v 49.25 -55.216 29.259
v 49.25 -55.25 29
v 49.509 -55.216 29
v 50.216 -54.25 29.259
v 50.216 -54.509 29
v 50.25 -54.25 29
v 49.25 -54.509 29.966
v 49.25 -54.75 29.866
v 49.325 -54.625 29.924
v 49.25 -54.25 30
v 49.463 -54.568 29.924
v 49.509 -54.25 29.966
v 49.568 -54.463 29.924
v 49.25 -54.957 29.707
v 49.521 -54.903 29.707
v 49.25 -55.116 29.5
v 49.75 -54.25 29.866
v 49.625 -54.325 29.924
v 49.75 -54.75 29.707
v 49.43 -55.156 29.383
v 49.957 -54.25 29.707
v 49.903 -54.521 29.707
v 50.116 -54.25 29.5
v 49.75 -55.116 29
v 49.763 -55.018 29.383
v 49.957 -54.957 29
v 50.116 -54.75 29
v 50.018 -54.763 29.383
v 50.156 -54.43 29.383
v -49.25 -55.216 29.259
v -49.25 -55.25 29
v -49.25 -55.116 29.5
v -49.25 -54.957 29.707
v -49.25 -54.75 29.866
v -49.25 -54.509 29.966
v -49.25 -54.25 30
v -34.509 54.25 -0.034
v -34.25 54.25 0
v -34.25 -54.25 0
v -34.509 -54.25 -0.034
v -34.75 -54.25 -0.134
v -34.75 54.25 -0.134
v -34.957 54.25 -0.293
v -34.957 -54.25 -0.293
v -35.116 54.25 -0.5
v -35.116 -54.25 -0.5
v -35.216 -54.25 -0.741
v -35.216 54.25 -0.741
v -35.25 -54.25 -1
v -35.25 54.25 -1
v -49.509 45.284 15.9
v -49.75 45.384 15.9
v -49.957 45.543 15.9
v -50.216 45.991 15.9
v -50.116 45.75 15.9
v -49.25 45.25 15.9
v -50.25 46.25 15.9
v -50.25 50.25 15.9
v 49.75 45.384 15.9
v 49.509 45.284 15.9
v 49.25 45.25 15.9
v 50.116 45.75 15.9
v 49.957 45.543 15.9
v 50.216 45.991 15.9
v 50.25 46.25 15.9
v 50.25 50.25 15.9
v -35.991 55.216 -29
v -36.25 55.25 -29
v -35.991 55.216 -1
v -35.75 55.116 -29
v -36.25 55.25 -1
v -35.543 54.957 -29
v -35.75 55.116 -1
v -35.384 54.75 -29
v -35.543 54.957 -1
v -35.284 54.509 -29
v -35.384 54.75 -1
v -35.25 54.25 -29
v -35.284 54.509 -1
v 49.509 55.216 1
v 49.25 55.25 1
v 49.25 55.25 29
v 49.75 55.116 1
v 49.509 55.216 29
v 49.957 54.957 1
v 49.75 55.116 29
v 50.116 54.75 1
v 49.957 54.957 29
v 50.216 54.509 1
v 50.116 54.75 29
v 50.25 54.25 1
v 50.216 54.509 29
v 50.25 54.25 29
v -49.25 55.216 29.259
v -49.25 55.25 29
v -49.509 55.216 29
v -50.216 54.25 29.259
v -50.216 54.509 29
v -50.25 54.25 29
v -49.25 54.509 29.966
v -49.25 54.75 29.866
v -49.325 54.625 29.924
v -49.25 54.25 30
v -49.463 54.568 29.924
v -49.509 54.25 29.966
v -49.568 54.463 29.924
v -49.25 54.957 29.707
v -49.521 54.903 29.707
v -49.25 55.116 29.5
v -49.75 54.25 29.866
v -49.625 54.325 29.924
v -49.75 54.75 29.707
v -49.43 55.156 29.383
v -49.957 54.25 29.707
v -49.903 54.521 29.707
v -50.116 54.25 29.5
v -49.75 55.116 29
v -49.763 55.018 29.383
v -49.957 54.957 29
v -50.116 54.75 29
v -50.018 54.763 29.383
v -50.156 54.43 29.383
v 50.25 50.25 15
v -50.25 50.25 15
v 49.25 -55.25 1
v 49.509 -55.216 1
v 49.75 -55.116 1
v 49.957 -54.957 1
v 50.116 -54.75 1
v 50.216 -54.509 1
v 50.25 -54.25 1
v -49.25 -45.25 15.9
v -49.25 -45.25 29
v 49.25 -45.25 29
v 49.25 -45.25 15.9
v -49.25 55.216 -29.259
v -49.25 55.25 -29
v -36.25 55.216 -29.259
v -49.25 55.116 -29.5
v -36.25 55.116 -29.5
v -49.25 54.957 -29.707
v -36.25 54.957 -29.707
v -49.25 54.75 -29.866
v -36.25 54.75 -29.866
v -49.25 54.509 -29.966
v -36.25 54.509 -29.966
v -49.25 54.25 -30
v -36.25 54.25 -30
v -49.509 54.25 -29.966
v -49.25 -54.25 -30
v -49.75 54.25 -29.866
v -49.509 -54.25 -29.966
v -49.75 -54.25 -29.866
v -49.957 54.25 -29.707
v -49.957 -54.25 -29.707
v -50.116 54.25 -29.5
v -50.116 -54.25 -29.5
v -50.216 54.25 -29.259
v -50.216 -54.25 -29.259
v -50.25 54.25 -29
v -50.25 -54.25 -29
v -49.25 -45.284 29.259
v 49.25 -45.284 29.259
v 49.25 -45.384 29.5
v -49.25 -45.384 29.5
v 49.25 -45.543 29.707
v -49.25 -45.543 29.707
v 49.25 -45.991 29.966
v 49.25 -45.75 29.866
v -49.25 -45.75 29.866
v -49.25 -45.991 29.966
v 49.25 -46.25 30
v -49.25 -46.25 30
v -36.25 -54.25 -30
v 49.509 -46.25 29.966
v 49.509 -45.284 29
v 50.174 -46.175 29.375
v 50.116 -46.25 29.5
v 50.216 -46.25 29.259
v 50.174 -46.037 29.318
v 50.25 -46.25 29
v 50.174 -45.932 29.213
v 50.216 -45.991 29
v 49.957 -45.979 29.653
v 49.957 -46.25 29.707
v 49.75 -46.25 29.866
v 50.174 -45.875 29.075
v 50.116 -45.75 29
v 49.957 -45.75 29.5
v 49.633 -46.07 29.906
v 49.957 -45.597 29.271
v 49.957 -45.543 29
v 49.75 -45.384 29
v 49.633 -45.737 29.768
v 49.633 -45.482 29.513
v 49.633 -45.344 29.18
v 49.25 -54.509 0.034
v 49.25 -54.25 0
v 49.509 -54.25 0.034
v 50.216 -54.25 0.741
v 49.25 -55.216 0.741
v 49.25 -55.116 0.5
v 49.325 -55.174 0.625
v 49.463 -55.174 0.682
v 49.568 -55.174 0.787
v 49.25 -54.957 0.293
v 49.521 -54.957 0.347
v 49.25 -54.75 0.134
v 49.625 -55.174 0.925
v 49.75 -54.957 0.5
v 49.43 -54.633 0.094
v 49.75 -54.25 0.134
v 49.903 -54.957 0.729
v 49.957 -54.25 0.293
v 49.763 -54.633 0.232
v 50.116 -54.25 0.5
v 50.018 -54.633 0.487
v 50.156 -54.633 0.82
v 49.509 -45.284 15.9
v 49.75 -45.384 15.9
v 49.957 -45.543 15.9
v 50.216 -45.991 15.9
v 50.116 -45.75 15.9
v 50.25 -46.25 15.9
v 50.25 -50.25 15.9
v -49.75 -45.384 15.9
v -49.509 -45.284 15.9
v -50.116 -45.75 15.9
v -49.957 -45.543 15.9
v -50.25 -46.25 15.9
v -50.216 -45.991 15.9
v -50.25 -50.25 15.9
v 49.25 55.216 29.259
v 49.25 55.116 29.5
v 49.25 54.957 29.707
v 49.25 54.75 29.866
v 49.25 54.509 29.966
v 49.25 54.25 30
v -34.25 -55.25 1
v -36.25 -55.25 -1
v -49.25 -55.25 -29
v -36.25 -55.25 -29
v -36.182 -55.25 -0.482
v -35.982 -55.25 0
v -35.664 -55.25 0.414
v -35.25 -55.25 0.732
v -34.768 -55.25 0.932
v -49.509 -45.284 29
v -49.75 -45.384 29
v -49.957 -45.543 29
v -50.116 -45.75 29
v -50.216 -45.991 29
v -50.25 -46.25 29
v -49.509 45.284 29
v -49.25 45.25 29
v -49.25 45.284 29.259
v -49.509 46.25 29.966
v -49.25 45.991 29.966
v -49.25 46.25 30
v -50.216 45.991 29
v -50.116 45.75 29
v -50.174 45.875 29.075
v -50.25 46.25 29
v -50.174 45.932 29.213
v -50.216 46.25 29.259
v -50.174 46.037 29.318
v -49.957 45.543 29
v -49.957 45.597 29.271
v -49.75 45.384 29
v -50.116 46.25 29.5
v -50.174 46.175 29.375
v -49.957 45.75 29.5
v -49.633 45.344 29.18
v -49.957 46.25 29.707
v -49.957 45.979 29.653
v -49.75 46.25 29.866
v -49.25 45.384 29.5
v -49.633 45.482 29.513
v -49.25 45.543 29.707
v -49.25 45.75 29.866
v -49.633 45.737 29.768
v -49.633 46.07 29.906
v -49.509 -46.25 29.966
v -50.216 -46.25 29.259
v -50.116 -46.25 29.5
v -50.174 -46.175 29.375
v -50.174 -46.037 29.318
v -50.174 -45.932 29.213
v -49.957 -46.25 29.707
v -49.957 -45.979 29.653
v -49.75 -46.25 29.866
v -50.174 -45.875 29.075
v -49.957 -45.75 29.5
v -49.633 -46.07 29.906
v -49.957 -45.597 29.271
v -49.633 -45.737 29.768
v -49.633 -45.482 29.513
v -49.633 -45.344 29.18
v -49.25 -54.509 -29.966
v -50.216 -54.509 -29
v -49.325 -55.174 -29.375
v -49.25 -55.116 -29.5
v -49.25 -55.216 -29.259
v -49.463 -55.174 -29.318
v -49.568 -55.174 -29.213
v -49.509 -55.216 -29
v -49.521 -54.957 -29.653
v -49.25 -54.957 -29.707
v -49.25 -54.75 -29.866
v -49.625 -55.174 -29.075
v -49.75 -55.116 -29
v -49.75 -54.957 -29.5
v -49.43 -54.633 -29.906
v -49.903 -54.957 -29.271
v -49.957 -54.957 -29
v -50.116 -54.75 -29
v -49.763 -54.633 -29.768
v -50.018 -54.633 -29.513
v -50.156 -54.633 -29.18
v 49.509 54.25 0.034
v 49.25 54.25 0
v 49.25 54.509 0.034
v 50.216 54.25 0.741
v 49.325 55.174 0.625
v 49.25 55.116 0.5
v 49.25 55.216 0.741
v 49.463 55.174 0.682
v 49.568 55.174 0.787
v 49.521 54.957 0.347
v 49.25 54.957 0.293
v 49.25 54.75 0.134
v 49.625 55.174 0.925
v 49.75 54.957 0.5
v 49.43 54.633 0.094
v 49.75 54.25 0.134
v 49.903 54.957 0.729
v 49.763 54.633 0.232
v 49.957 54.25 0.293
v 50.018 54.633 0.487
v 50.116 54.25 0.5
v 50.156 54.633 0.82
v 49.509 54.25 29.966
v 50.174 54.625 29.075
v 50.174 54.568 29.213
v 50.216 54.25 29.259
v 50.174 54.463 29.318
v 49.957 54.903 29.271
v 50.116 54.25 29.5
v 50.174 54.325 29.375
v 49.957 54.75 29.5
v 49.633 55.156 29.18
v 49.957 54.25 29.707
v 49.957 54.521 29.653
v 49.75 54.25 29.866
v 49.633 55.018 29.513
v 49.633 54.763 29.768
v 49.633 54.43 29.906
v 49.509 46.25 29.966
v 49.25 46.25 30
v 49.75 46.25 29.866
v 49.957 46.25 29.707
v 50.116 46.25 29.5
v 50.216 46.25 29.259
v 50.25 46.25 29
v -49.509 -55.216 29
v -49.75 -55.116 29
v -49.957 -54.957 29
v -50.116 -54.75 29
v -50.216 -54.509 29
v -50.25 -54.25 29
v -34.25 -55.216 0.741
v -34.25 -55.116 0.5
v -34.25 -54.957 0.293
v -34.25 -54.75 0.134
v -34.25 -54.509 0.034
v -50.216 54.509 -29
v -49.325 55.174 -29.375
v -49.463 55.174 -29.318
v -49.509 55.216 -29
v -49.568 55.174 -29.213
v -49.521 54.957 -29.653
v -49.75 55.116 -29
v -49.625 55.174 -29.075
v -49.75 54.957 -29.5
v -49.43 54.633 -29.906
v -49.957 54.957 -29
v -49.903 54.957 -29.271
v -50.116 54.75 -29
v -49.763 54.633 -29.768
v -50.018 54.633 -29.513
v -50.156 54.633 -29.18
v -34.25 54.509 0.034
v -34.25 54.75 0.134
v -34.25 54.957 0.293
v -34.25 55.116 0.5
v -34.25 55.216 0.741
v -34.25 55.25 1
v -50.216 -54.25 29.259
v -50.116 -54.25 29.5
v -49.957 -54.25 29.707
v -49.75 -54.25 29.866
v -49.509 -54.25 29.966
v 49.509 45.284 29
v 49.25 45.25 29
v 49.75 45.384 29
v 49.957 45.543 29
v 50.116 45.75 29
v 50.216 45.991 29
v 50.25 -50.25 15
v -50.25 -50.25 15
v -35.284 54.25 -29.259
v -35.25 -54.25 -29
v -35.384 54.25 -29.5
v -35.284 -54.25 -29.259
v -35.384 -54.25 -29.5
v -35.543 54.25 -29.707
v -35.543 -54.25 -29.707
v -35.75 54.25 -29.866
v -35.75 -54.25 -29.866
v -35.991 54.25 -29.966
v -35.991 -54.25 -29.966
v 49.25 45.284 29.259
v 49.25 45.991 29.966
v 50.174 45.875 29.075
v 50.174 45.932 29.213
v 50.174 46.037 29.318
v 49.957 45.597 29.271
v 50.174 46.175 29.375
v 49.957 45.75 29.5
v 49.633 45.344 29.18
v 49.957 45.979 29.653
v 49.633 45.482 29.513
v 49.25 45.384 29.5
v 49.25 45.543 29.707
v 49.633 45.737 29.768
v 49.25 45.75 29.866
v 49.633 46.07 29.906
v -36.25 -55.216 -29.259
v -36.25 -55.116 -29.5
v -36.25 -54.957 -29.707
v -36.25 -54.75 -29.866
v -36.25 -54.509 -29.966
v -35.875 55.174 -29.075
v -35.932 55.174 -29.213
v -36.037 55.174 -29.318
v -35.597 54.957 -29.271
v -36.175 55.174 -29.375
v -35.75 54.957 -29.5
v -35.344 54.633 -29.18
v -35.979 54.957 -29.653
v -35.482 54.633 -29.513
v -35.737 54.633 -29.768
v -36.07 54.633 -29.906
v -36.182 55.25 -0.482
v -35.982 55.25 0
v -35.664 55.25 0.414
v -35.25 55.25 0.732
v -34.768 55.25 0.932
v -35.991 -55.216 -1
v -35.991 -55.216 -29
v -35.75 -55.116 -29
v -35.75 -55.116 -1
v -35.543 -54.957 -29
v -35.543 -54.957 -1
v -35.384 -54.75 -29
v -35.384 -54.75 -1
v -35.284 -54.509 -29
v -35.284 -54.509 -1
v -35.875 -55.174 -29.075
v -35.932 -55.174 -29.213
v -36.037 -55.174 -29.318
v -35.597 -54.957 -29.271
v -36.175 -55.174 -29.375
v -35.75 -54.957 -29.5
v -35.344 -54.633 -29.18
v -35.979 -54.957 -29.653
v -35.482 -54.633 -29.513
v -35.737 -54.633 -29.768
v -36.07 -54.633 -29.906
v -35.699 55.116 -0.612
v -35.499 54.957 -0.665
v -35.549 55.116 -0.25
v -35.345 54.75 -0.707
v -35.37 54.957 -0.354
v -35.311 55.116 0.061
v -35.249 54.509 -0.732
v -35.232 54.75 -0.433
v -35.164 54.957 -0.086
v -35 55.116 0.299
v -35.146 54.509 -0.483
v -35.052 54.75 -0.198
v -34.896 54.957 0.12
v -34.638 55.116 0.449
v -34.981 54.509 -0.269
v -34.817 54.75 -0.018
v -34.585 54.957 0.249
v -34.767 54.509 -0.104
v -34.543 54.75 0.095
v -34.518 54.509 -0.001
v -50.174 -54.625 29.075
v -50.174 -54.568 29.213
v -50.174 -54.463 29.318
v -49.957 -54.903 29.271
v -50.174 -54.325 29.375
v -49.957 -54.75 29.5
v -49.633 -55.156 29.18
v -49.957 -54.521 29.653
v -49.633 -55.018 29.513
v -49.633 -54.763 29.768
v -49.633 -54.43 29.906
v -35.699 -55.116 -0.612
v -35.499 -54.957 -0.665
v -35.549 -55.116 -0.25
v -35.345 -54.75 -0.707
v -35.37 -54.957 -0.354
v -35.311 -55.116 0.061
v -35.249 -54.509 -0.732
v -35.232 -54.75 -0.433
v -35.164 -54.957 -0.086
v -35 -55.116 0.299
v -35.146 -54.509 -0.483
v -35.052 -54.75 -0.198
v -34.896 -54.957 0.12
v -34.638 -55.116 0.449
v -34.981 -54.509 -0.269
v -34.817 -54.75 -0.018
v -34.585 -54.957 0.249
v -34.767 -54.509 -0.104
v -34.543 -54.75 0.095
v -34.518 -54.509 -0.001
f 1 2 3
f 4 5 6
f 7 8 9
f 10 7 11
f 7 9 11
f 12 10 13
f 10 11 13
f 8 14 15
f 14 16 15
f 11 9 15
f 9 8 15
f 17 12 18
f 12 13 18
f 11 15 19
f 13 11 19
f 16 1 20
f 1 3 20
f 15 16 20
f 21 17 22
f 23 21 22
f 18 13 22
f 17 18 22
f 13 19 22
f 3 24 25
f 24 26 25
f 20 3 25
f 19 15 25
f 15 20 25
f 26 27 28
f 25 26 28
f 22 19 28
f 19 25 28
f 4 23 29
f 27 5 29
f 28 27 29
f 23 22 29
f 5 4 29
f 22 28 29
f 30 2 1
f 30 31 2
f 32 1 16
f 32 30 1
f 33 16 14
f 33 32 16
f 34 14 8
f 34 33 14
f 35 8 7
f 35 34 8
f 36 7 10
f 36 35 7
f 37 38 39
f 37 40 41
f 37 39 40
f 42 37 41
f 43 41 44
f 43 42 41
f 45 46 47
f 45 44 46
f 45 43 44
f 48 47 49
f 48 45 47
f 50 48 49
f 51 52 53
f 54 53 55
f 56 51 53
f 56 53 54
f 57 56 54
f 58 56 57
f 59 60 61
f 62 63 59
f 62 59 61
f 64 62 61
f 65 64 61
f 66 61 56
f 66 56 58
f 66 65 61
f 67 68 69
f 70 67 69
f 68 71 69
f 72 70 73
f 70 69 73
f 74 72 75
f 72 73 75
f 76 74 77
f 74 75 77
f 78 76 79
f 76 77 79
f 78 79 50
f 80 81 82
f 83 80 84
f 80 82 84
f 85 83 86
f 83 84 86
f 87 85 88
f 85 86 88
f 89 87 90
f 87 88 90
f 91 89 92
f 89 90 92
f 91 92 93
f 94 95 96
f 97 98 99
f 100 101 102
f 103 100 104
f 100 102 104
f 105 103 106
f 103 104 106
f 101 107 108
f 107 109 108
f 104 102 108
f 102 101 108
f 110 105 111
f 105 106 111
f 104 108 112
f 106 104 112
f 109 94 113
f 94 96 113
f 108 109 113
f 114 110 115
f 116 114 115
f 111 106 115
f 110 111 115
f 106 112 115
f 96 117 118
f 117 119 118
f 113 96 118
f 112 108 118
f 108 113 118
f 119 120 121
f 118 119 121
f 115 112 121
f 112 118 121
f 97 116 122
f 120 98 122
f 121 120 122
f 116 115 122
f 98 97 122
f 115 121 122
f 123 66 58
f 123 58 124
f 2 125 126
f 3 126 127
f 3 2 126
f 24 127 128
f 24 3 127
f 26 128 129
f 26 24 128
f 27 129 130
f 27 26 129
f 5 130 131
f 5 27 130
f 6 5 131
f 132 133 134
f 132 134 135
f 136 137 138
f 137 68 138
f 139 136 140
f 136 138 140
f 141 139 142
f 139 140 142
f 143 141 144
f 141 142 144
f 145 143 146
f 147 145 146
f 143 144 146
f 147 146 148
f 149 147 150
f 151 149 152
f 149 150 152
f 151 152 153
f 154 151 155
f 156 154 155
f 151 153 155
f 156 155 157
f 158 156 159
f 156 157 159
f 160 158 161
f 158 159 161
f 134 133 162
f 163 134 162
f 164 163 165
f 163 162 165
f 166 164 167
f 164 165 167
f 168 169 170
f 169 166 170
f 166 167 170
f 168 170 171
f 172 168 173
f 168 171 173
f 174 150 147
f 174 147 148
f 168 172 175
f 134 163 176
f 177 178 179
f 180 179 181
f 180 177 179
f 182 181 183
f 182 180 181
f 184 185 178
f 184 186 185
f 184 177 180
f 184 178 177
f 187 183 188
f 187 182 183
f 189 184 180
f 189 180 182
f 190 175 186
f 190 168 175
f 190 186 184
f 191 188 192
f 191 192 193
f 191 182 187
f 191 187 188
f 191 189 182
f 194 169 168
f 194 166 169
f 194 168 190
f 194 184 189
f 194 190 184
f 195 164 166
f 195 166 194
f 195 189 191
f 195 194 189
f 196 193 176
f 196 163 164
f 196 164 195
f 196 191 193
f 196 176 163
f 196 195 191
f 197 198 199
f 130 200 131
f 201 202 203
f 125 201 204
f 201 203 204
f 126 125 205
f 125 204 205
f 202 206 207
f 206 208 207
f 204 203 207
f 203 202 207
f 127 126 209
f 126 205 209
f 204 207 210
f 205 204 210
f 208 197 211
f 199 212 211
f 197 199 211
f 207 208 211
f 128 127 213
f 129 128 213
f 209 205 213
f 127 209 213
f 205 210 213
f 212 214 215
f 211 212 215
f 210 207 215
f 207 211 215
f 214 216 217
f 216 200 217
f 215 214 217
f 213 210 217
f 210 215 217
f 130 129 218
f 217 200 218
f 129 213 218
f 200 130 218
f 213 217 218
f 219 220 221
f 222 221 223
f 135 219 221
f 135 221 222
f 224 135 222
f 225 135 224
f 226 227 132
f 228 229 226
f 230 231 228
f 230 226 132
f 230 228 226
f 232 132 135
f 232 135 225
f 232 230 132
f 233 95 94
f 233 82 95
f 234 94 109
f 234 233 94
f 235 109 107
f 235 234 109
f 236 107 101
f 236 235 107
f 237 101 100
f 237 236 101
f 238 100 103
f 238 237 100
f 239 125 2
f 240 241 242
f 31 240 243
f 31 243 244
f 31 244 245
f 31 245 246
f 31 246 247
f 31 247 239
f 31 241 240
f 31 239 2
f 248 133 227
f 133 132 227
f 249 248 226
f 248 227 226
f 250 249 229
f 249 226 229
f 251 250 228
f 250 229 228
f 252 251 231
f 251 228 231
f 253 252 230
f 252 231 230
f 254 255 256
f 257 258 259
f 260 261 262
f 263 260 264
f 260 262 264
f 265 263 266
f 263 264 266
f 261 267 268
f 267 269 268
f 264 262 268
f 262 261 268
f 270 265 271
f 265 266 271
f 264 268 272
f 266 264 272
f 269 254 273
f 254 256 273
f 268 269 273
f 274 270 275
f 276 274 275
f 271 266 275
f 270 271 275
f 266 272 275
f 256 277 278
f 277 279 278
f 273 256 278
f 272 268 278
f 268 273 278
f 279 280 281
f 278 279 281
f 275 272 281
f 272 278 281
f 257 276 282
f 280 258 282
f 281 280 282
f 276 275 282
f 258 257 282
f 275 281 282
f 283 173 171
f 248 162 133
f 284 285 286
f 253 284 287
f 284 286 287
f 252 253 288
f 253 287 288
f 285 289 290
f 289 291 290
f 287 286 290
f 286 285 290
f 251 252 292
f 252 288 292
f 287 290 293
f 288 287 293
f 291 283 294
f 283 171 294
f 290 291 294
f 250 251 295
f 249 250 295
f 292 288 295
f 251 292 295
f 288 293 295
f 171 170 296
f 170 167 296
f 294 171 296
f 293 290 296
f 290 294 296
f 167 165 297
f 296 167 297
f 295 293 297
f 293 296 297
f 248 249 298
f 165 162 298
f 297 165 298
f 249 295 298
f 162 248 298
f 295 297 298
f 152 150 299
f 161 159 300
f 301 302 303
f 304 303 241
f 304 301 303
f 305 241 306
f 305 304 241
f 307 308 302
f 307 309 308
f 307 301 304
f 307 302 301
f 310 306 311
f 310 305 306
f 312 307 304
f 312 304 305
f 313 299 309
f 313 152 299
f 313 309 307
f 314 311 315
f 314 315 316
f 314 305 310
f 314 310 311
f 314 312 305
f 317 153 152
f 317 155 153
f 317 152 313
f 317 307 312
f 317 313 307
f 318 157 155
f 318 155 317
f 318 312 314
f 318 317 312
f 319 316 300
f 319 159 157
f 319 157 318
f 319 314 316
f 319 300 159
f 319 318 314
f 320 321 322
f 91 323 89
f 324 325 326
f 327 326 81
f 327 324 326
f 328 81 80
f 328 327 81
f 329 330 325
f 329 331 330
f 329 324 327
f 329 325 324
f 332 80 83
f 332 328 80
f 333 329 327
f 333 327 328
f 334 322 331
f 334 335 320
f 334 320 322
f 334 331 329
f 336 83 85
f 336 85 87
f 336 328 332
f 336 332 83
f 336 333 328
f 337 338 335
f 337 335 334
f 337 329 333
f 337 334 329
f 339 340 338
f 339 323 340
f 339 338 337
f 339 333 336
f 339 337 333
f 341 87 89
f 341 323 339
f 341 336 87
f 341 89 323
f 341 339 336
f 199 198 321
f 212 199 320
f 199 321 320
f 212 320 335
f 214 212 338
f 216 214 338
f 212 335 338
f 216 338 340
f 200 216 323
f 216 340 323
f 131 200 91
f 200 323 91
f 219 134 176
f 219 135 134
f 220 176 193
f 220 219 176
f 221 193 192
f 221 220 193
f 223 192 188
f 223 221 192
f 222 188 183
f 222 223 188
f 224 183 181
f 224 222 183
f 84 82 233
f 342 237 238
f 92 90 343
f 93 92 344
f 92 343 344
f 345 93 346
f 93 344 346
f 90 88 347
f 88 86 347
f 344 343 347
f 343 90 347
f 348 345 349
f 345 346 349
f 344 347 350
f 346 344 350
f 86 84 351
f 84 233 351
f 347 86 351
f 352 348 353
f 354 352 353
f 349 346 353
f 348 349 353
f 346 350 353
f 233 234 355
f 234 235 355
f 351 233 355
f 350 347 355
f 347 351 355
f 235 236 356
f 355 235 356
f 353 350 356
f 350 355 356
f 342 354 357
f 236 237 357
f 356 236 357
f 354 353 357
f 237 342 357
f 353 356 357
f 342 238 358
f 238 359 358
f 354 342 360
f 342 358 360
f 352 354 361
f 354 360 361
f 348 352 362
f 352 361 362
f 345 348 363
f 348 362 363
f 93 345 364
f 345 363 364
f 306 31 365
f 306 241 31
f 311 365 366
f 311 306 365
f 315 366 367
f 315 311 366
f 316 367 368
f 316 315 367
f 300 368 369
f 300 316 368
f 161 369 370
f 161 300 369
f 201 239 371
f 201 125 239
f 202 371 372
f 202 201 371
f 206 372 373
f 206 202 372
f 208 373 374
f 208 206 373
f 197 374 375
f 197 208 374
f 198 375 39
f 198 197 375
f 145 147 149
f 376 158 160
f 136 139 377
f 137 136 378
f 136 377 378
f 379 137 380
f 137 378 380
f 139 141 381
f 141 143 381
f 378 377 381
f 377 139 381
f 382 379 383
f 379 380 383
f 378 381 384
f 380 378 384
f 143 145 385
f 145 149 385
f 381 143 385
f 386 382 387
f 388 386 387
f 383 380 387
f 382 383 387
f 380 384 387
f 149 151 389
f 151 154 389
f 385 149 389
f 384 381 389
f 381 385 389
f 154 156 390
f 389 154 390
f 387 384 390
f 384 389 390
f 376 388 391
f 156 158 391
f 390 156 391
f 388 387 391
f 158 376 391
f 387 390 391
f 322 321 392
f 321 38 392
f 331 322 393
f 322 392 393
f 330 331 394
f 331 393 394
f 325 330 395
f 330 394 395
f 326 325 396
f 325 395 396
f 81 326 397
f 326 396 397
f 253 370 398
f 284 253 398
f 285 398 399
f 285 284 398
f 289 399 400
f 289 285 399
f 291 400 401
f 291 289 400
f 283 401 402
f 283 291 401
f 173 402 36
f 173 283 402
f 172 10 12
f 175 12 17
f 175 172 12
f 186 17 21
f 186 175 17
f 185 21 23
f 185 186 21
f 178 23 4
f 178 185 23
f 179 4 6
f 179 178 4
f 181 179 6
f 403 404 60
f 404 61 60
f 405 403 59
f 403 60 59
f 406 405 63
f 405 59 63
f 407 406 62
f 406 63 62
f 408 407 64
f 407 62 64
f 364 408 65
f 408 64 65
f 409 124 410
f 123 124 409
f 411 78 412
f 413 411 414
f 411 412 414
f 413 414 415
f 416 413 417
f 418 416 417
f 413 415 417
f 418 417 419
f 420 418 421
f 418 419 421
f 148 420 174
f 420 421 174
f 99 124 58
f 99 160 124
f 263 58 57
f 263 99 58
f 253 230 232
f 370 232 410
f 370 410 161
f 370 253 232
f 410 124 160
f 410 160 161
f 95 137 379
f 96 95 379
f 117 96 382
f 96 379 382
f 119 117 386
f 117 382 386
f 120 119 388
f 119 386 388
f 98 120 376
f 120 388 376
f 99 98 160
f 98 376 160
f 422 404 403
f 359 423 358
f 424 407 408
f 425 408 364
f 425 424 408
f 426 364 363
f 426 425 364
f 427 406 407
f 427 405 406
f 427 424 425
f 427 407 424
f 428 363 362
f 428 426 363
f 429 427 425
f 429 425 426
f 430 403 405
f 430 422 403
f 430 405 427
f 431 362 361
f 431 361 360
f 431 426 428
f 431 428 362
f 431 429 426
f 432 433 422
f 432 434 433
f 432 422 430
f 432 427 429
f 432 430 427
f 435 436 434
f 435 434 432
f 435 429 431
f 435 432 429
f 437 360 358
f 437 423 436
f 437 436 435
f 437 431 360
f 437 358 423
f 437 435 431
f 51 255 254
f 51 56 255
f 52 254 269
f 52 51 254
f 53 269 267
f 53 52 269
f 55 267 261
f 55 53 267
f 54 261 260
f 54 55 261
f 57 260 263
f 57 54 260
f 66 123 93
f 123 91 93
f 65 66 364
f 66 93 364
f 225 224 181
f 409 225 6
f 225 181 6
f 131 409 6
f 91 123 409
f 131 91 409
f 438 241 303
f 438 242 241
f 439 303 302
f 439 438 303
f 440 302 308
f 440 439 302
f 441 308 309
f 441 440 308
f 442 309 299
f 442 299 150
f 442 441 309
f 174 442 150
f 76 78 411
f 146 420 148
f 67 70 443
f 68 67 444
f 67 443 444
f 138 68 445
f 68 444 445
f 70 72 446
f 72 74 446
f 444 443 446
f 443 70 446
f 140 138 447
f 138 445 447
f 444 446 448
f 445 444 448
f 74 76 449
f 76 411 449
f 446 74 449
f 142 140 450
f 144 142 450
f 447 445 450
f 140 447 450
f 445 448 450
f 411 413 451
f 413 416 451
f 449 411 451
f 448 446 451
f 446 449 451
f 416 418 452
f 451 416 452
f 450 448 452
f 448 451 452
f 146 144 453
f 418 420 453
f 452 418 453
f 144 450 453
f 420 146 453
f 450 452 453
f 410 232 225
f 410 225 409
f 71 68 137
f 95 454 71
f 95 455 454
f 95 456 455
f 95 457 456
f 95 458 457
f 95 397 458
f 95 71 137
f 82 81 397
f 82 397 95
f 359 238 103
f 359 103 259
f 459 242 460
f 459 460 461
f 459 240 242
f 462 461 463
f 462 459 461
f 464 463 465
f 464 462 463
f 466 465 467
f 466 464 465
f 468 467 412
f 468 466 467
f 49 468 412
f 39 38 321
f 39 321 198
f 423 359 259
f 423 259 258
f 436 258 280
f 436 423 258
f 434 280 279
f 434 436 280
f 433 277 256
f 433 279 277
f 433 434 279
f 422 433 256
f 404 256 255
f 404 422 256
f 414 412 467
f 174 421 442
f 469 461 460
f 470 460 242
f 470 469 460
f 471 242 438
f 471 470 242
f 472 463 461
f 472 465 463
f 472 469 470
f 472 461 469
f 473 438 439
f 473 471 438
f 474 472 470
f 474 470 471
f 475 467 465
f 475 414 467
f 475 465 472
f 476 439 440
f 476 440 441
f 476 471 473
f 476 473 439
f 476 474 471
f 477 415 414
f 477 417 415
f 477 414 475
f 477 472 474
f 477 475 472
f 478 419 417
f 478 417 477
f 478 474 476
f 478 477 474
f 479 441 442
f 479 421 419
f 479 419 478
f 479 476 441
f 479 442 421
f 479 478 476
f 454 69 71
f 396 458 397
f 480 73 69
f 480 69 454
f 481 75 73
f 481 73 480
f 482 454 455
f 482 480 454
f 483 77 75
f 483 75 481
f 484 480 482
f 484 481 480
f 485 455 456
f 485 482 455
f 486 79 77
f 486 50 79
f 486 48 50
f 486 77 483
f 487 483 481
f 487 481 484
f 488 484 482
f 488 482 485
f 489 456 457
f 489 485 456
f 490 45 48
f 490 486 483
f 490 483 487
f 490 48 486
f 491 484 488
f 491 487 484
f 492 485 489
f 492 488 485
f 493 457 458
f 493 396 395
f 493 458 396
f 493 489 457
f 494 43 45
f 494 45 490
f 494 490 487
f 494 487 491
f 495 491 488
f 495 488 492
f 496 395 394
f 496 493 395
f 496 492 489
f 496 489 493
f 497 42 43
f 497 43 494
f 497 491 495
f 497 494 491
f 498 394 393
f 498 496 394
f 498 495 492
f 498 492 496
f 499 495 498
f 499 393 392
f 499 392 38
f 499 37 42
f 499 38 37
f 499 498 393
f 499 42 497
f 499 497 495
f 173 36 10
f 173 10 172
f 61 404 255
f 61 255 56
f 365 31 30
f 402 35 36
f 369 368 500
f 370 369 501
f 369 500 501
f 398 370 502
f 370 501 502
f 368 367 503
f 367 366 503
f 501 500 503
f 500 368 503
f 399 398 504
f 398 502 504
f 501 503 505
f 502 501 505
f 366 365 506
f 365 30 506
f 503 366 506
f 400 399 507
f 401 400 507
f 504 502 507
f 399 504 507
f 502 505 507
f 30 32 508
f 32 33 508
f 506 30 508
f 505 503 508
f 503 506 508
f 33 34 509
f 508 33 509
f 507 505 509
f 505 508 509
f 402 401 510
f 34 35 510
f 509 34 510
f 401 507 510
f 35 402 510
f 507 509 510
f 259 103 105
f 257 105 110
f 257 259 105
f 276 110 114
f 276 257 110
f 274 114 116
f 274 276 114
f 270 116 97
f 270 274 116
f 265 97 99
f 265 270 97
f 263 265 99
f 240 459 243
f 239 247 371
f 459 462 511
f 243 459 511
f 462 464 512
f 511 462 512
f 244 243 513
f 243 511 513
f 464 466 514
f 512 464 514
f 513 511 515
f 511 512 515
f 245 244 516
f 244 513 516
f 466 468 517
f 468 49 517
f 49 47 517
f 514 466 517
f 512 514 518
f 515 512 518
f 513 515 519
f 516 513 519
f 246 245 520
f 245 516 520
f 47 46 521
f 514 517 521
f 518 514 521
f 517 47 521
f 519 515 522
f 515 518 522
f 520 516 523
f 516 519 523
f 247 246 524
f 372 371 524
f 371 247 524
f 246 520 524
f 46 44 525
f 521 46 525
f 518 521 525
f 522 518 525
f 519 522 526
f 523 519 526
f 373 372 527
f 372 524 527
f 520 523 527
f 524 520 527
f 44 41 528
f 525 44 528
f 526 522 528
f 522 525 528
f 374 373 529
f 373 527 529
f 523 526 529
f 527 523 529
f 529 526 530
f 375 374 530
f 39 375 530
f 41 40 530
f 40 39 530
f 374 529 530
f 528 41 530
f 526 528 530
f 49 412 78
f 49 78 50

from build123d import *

# Parameters (mm, degrees)
EXTRUDE001_DEPTH = 50.25
SKETCH_W         = 100.5
SKETCH_H         = 100.5
EXTRUDE_DEPTH    = 15
SKETCH002_W      = 15
SKETCH002_H      = 30
EXTRUDE002_DEPTH = 55.25
FILLET_R         = 1


with BuildPart() as extrude001:
    # Sketch001 (on Sketch) → Extrude001 (new body, symmetric)
    with BuildSketch(Plane.YZ):
        Polygon((-55.25, 0), (-55.25, 30), (-45.25, 30), (-45.25, 15.9), (-50.25, 15.9), (-50.25, 15), (-45.25, 15), (-45.25, 0), align=None)
        Polygon((55.25, 0), (55.25, 30), (45.25, 30), (45.25, 15.9), (50.25, 15.9), (50.25, 15), (45.25, 15), (45.25, 0), align=None)
    extrude(amount=EXTRUDE001_DEPTH, both=True)


with BuildPart() as fusion:
    # Sketch → Extrude (new body)
    with BuildSketch(Plane.XY):
        Rectangle(SKETCH_W, SKETCH_H)
    extrude(amount=EXTRUDE_DEPTH)

    # Fusion: union Extrude001
    add(extrude001.part)


with BuildPart() as fillet_body:
    # Sketch002 → Extrude002 (new body, symmetric)
    with BuildSketch(Plane.XZ):
        with Locations((-42.75, -15)):
            Rectangle(SKETCH002_W, SKETCH002_H)
    extrude(amount=EXTRUDE002_DEPTH, both=True)

    # Fusion001: union Fusion
    add(fusion.part)

    # Fillet
    fillet_edges = [fillet_body.edges().sort_by_distance(p)[0] for p in [
        (-35.25, 0, 0),
        (-35.25, 0, -30),
        (-35.25, 55.25, -15),
        (-35.25, -55.25, -15),
        (-50.25, 0, -30),
        (-42.75, 55.25, -30),
        (-42.75, -55.25, -30),
        (50.25, 0, 0),
        (7.5, -55.25, 0),
        (7.5, 55.25, 0),
        (-50.25, 55.25, 0),
        (0, 55.25, 30),
        (50.25, 55.25, 15),
        (0, 45.25, 30),
        (50.25, 45.25, 22.95),
        (-50.25, 45.25, 22.95),
        (50.25, 50.25, 30),
        (-50.25, 50.25, 30),
        (50.25, -55.25, 15),
        (0, -55.25, 30),
        (-50.25, -55.25, 0),
        (0, -45.25, 30),
        (50.25, -50.25, 30),
        (-50.25, -50.25, 30),
        (50.25, -45.25, 22.95),
        (-50.25, -45.25, 22.95),
    ]]
    fillet(fillet_edges, radius=FILLET_R)


solid = fillet_body.part
